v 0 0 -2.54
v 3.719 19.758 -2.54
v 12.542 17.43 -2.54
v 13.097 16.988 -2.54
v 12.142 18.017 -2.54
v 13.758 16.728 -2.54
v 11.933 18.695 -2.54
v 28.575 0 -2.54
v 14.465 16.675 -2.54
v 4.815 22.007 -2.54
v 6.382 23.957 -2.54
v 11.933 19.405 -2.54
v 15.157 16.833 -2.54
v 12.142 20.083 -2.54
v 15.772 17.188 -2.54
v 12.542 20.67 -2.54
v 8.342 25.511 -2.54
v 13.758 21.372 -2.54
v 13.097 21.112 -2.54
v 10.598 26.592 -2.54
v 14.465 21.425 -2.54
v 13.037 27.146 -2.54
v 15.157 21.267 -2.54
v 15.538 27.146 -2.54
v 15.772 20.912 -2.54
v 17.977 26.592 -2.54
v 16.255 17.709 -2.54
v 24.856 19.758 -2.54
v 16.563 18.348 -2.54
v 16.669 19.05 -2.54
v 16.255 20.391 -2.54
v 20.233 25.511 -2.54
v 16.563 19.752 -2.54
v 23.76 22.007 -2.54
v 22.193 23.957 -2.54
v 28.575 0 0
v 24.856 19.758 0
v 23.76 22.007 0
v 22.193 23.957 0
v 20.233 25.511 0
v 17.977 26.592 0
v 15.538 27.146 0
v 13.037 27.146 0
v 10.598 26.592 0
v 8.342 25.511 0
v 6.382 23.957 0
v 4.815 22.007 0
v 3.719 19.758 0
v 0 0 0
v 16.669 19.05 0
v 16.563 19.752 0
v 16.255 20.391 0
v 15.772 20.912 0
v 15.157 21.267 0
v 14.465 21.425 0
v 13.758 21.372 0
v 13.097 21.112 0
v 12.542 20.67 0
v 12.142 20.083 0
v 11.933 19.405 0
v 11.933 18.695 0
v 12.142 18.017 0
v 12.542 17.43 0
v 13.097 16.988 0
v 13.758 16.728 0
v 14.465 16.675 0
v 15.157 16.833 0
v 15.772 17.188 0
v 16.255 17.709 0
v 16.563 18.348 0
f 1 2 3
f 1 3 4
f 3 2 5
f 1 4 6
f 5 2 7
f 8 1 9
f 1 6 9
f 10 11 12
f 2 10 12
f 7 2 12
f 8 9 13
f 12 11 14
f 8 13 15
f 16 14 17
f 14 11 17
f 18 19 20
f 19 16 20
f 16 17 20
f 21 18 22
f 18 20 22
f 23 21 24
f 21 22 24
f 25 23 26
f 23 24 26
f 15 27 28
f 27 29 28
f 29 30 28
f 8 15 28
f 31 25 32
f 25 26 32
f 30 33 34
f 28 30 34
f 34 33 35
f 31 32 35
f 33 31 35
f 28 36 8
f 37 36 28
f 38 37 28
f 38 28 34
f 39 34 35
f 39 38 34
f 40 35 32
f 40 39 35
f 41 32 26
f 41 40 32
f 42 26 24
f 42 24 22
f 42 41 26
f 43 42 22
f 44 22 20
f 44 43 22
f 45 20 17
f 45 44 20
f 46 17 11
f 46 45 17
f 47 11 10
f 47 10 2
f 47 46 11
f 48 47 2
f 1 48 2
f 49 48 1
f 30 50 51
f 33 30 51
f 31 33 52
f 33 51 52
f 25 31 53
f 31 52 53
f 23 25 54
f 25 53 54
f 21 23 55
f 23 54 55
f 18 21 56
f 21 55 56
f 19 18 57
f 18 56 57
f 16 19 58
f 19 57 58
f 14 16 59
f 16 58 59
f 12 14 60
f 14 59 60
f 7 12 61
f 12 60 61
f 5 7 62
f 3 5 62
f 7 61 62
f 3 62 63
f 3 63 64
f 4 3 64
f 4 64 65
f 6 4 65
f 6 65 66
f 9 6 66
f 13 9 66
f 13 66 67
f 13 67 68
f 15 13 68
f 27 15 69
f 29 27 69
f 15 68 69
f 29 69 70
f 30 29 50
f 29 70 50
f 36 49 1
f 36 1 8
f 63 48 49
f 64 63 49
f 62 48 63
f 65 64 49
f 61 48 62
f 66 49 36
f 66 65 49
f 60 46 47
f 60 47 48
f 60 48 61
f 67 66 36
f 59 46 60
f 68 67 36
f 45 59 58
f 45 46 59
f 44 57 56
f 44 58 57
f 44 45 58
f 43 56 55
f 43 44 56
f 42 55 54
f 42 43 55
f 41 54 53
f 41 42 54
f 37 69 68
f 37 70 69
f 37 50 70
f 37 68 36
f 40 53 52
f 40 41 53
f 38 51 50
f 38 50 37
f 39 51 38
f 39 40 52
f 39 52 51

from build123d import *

# Parameters (mm, degrees)
SKETCH1_R           = 2.38125
BOSS_EXTRUDE1_DEPTH = 2.54


with BuildPart() as part:
    # Sketch1 → Boss-Extrude1 (new body)
    with BuildSketch(Plane.XY):
        with BuildLine():
            Line((0, 0), (28.575, 0))
            Line((28.575, 0), (24.855666251, 19.758430469))
            ThreePointArc((24.855666251, 19.758430469), (14.2875, 27.2161), (3.719333749, 19.758430469))
            Line((3.719333749, 19.758430469), (0, 0))
        make_face()
        with Locations((14.2875, 19.05)):
            Circle(SKETCH1_R, mode=Mode.SUBTRACT)
    extrude(amount=-BOSS_EXTRUDE1_DEPTH)


solid = part.part
